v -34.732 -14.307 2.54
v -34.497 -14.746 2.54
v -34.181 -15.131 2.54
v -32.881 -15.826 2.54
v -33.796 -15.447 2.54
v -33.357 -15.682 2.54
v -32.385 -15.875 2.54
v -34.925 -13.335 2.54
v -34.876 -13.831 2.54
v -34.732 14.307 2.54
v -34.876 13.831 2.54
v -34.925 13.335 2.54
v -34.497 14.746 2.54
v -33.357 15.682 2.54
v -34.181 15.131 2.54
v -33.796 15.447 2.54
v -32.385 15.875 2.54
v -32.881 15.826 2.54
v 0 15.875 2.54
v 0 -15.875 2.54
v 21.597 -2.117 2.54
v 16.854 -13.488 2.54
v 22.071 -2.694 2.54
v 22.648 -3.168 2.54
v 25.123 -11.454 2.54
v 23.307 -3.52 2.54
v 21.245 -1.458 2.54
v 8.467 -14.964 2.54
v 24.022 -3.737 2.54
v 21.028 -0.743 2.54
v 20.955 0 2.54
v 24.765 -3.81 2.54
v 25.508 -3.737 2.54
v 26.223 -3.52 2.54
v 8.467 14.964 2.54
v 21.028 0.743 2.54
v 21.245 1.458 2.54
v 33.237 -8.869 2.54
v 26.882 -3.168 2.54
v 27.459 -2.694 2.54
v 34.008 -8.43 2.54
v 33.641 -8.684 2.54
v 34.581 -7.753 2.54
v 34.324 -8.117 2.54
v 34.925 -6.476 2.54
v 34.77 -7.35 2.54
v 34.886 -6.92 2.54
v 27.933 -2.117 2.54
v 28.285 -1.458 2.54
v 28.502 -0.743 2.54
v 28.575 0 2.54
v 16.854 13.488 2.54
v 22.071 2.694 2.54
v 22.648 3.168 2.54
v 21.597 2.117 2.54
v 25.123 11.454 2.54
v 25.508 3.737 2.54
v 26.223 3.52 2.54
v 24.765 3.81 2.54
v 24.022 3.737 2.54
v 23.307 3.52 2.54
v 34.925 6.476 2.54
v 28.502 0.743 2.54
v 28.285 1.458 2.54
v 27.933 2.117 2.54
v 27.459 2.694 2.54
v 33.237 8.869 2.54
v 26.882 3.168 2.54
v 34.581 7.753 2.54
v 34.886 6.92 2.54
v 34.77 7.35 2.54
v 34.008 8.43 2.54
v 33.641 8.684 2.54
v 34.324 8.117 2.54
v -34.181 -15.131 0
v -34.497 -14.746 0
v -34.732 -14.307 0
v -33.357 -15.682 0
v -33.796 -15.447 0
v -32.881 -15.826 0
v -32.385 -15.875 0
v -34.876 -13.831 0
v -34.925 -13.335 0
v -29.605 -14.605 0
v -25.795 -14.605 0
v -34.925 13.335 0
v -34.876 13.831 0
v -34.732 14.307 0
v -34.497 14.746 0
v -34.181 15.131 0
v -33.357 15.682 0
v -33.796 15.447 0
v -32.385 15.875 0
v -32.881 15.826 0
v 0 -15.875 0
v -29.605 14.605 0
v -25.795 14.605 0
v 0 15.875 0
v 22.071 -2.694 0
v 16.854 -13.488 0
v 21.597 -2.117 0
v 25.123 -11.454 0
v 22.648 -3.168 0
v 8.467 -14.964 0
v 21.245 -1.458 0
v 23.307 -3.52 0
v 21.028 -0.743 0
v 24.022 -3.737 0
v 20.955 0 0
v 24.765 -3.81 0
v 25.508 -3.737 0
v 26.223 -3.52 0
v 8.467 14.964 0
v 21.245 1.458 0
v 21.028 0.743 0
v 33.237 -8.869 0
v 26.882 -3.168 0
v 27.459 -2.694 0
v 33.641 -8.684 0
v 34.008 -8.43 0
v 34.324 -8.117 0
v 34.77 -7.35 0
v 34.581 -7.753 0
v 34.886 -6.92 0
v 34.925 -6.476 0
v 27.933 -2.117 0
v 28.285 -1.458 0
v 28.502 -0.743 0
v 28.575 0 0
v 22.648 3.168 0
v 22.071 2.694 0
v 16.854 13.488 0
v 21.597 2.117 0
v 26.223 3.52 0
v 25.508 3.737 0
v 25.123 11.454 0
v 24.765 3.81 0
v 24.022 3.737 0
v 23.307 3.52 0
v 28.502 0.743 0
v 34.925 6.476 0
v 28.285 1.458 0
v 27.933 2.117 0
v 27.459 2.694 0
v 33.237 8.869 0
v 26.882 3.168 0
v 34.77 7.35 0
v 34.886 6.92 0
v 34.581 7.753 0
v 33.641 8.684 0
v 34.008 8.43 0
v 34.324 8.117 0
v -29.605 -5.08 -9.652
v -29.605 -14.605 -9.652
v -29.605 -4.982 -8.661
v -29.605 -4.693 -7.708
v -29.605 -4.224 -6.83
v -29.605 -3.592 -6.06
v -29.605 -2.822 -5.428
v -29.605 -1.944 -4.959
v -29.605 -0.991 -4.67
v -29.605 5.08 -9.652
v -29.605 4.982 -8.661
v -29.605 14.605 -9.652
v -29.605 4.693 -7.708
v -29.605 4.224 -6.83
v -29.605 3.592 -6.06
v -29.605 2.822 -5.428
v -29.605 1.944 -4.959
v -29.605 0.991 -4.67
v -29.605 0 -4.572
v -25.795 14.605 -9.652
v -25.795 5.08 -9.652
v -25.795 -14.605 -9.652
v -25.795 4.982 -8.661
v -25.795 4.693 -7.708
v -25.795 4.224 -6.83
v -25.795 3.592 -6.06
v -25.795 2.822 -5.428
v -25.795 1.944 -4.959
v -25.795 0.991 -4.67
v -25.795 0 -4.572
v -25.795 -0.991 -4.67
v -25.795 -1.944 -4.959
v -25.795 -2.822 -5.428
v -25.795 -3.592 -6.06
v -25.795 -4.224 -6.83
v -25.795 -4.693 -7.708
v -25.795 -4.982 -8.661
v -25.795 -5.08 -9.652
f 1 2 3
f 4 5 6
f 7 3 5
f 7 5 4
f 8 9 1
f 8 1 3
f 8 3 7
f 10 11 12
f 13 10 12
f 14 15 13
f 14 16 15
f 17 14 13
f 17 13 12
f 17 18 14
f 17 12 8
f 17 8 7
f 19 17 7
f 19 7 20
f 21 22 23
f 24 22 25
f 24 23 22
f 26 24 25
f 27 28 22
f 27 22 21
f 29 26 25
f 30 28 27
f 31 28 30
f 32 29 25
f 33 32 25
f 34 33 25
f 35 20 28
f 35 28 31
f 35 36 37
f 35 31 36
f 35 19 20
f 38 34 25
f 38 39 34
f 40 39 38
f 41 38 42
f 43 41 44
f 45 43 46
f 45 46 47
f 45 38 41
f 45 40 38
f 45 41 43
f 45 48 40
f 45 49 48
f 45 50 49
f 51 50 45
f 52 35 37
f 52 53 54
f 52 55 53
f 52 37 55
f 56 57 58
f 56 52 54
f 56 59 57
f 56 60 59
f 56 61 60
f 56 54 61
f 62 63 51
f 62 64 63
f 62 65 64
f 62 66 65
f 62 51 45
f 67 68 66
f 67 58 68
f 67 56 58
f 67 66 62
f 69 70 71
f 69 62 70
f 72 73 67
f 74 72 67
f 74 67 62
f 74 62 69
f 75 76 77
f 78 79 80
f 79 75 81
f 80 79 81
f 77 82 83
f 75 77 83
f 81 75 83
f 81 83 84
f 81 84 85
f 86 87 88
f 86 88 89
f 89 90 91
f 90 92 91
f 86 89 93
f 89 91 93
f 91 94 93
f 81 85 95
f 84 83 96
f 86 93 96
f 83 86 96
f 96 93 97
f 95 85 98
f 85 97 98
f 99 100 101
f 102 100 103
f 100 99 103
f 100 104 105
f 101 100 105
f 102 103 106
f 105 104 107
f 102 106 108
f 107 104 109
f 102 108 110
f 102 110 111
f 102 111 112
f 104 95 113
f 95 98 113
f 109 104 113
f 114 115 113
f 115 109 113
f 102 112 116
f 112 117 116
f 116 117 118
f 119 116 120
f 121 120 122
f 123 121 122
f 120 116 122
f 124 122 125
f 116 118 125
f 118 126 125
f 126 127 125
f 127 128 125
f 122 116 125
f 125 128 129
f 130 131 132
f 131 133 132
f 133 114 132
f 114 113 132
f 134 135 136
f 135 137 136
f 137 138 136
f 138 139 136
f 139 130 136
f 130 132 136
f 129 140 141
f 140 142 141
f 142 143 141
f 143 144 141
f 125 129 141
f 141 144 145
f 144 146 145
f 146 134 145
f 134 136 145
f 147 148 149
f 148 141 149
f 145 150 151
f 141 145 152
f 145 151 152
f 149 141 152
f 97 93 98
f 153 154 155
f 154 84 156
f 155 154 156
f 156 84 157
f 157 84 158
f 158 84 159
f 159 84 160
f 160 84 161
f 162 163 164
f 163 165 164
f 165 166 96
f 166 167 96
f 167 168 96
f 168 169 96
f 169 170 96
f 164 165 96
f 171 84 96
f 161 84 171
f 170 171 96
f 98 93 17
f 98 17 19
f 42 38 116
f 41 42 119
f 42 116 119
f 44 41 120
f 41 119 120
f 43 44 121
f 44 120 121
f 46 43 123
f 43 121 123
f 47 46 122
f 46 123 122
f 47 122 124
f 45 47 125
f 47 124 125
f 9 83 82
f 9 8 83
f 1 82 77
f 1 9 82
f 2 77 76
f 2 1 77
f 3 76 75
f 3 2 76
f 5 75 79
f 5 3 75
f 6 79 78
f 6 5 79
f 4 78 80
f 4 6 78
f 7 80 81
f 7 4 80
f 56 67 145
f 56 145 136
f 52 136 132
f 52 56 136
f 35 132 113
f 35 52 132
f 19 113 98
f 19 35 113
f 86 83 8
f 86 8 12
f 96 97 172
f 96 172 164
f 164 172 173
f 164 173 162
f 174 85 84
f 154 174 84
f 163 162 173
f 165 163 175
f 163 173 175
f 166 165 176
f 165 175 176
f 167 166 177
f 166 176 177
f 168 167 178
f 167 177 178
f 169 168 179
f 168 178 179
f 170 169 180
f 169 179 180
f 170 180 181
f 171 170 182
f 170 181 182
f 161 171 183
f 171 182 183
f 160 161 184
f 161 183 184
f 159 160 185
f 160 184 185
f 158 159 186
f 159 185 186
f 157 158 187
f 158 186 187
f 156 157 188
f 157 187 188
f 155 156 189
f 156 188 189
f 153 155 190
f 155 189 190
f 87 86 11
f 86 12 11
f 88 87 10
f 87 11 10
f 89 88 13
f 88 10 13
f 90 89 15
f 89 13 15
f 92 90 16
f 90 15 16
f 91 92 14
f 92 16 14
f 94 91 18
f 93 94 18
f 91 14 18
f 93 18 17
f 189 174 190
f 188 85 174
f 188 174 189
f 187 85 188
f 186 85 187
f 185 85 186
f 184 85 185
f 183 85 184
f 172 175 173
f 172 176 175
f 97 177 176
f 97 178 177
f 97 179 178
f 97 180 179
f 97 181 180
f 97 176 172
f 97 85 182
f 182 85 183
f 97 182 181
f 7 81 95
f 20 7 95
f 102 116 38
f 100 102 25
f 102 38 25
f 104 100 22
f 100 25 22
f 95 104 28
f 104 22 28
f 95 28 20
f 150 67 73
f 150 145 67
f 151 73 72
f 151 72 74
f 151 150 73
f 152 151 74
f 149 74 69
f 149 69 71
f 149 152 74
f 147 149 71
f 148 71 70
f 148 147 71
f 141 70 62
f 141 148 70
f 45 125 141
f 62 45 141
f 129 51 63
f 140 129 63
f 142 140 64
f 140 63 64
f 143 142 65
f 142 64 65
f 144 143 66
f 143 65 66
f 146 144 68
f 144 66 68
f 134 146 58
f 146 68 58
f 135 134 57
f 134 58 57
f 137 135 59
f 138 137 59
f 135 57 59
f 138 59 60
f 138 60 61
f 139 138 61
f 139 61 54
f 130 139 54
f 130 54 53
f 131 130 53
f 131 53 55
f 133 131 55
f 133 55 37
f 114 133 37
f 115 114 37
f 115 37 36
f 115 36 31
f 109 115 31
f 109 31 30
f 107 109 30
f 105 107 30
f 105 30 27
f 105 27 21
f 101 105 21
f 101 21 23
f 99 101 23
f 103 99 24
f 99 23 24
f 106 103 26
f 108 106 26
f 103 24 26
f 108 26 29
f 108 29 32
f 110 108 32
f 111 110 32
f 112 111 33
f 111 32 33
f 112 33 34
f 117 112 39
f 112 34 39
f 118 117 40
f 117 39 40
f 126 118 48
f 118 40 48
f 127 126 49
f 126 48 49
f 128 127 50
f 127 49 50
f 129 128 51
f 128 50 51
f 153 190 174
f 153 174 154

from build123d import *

# Parameters (mm, degrees)
SKETCH1_W           = 69.85
SKETCH1_H           = 31.75
BOSS_EXTRUDE1_DEPTH = 2.54
SKETCH2_W           = 3.81
SKETCH2_H           = 29.21
BOSS_EXTRUDE2_DEPTH = 9.652
SKETCH3_R           = 5.08
CUT_EXTRUDE1_DEPTH  = 10.16
CUT_EXTRUDE2_DEPTH  = 10.16
FILLET1_R           = 2.54
FILLET2_R           = 2.54
SKETCH11_R          = 3.81
CUT_EXTRUDE3_DEPTH  = 10.16


with BuildPart() as part:
    # Sketch1 → Boss-Extrude1 (new body)
    with BuildSketch(Plane.XY):
        Rectangle(SKETCH1_W, SKETCH1_H)
    extrude(amount=BOSS_EXTRUDE1_DEPTH)

    # Sketch2 → Boss-Extrude2 (add)
    with BuildSketch(Plane(origin=(0, 0, 0), x_dir=(-1, 0, 0), z_dir=(0, 0, -1))):
        with Locations((27.700292401, 0)):
            Rectangle(SKETCH2_W, SKETCH2_H)
    extrude(amount=BOSS_EXTRUDE2_DEPTH)

    # Sketch3 → Cut-Extrude1 (cut)
    with BuildSketch(Plane(origin=(-25.795292401, 0, 0), x_dir=(0, 0, -1), z_dir=(1, 0, 0))):
        with Locations((9.652, 0)):
            Circle(SKETCH3_R)
    extrude(amount=-CUT_EXTRUDE1_DEPTH, mode=Mode.SUBTRACT)

    # Sketch9 → Cut-Extrude2 (cut)
    with BuildSketch(Plane.XY.offset(2.54)):
        with BuildLine():
            Line((0, 15.875), (34.925, 15.875))
            Line((34.925, 15.875), (34.925, 8.255))
            ThreePointArc((34.925, 8.255), (17.731940388, 13.29993511), (0, 15.875))
        make_face()
        with BuildLine():
            Line((0, -15.875), (34.925, -15.875))
            Line((34.925, -15.875), (34.925, -8.255))
            ThreePointArc((34.925, -8.255), (17.731940388, -13.29993511), (0, -15.875))
        make_face()
    extrude(amount=-CUT_EXTRUDE2_DEPTH, mode=Mode.SUBTRACT)

    # Fillet1
    fillet1_edges = [part.edges().sort_by_distance(p)[0] for p in [
        (-34.925, 15.875, 1.27),
        (-34.925, -15.875, 1.27),
    ]]
    fillet(fillet1_edges, radius=FILLET1_R)

    # Fillet2
    fillet2_edges = [part.edges().sort_by_distance(p)[0] for p in [
        (34.925, 8.255, 1.27),
        (34.925, -8.255, 1.27),
    ]]
    fillet(fillet2_edges, radius=FILLET2_R)

    # Sketch11 → Cut-Extrude3 (cut)
    with BuildSketch(Plane.XY.offset(2.54)):
        with Locations((24.765, 0)):
            Circle(SKETCH11_R)
    extrude(amount=-CUT_EXTRUDE3_DEPTH, mode=Mode.SUBTRACT)


solid = part.part
